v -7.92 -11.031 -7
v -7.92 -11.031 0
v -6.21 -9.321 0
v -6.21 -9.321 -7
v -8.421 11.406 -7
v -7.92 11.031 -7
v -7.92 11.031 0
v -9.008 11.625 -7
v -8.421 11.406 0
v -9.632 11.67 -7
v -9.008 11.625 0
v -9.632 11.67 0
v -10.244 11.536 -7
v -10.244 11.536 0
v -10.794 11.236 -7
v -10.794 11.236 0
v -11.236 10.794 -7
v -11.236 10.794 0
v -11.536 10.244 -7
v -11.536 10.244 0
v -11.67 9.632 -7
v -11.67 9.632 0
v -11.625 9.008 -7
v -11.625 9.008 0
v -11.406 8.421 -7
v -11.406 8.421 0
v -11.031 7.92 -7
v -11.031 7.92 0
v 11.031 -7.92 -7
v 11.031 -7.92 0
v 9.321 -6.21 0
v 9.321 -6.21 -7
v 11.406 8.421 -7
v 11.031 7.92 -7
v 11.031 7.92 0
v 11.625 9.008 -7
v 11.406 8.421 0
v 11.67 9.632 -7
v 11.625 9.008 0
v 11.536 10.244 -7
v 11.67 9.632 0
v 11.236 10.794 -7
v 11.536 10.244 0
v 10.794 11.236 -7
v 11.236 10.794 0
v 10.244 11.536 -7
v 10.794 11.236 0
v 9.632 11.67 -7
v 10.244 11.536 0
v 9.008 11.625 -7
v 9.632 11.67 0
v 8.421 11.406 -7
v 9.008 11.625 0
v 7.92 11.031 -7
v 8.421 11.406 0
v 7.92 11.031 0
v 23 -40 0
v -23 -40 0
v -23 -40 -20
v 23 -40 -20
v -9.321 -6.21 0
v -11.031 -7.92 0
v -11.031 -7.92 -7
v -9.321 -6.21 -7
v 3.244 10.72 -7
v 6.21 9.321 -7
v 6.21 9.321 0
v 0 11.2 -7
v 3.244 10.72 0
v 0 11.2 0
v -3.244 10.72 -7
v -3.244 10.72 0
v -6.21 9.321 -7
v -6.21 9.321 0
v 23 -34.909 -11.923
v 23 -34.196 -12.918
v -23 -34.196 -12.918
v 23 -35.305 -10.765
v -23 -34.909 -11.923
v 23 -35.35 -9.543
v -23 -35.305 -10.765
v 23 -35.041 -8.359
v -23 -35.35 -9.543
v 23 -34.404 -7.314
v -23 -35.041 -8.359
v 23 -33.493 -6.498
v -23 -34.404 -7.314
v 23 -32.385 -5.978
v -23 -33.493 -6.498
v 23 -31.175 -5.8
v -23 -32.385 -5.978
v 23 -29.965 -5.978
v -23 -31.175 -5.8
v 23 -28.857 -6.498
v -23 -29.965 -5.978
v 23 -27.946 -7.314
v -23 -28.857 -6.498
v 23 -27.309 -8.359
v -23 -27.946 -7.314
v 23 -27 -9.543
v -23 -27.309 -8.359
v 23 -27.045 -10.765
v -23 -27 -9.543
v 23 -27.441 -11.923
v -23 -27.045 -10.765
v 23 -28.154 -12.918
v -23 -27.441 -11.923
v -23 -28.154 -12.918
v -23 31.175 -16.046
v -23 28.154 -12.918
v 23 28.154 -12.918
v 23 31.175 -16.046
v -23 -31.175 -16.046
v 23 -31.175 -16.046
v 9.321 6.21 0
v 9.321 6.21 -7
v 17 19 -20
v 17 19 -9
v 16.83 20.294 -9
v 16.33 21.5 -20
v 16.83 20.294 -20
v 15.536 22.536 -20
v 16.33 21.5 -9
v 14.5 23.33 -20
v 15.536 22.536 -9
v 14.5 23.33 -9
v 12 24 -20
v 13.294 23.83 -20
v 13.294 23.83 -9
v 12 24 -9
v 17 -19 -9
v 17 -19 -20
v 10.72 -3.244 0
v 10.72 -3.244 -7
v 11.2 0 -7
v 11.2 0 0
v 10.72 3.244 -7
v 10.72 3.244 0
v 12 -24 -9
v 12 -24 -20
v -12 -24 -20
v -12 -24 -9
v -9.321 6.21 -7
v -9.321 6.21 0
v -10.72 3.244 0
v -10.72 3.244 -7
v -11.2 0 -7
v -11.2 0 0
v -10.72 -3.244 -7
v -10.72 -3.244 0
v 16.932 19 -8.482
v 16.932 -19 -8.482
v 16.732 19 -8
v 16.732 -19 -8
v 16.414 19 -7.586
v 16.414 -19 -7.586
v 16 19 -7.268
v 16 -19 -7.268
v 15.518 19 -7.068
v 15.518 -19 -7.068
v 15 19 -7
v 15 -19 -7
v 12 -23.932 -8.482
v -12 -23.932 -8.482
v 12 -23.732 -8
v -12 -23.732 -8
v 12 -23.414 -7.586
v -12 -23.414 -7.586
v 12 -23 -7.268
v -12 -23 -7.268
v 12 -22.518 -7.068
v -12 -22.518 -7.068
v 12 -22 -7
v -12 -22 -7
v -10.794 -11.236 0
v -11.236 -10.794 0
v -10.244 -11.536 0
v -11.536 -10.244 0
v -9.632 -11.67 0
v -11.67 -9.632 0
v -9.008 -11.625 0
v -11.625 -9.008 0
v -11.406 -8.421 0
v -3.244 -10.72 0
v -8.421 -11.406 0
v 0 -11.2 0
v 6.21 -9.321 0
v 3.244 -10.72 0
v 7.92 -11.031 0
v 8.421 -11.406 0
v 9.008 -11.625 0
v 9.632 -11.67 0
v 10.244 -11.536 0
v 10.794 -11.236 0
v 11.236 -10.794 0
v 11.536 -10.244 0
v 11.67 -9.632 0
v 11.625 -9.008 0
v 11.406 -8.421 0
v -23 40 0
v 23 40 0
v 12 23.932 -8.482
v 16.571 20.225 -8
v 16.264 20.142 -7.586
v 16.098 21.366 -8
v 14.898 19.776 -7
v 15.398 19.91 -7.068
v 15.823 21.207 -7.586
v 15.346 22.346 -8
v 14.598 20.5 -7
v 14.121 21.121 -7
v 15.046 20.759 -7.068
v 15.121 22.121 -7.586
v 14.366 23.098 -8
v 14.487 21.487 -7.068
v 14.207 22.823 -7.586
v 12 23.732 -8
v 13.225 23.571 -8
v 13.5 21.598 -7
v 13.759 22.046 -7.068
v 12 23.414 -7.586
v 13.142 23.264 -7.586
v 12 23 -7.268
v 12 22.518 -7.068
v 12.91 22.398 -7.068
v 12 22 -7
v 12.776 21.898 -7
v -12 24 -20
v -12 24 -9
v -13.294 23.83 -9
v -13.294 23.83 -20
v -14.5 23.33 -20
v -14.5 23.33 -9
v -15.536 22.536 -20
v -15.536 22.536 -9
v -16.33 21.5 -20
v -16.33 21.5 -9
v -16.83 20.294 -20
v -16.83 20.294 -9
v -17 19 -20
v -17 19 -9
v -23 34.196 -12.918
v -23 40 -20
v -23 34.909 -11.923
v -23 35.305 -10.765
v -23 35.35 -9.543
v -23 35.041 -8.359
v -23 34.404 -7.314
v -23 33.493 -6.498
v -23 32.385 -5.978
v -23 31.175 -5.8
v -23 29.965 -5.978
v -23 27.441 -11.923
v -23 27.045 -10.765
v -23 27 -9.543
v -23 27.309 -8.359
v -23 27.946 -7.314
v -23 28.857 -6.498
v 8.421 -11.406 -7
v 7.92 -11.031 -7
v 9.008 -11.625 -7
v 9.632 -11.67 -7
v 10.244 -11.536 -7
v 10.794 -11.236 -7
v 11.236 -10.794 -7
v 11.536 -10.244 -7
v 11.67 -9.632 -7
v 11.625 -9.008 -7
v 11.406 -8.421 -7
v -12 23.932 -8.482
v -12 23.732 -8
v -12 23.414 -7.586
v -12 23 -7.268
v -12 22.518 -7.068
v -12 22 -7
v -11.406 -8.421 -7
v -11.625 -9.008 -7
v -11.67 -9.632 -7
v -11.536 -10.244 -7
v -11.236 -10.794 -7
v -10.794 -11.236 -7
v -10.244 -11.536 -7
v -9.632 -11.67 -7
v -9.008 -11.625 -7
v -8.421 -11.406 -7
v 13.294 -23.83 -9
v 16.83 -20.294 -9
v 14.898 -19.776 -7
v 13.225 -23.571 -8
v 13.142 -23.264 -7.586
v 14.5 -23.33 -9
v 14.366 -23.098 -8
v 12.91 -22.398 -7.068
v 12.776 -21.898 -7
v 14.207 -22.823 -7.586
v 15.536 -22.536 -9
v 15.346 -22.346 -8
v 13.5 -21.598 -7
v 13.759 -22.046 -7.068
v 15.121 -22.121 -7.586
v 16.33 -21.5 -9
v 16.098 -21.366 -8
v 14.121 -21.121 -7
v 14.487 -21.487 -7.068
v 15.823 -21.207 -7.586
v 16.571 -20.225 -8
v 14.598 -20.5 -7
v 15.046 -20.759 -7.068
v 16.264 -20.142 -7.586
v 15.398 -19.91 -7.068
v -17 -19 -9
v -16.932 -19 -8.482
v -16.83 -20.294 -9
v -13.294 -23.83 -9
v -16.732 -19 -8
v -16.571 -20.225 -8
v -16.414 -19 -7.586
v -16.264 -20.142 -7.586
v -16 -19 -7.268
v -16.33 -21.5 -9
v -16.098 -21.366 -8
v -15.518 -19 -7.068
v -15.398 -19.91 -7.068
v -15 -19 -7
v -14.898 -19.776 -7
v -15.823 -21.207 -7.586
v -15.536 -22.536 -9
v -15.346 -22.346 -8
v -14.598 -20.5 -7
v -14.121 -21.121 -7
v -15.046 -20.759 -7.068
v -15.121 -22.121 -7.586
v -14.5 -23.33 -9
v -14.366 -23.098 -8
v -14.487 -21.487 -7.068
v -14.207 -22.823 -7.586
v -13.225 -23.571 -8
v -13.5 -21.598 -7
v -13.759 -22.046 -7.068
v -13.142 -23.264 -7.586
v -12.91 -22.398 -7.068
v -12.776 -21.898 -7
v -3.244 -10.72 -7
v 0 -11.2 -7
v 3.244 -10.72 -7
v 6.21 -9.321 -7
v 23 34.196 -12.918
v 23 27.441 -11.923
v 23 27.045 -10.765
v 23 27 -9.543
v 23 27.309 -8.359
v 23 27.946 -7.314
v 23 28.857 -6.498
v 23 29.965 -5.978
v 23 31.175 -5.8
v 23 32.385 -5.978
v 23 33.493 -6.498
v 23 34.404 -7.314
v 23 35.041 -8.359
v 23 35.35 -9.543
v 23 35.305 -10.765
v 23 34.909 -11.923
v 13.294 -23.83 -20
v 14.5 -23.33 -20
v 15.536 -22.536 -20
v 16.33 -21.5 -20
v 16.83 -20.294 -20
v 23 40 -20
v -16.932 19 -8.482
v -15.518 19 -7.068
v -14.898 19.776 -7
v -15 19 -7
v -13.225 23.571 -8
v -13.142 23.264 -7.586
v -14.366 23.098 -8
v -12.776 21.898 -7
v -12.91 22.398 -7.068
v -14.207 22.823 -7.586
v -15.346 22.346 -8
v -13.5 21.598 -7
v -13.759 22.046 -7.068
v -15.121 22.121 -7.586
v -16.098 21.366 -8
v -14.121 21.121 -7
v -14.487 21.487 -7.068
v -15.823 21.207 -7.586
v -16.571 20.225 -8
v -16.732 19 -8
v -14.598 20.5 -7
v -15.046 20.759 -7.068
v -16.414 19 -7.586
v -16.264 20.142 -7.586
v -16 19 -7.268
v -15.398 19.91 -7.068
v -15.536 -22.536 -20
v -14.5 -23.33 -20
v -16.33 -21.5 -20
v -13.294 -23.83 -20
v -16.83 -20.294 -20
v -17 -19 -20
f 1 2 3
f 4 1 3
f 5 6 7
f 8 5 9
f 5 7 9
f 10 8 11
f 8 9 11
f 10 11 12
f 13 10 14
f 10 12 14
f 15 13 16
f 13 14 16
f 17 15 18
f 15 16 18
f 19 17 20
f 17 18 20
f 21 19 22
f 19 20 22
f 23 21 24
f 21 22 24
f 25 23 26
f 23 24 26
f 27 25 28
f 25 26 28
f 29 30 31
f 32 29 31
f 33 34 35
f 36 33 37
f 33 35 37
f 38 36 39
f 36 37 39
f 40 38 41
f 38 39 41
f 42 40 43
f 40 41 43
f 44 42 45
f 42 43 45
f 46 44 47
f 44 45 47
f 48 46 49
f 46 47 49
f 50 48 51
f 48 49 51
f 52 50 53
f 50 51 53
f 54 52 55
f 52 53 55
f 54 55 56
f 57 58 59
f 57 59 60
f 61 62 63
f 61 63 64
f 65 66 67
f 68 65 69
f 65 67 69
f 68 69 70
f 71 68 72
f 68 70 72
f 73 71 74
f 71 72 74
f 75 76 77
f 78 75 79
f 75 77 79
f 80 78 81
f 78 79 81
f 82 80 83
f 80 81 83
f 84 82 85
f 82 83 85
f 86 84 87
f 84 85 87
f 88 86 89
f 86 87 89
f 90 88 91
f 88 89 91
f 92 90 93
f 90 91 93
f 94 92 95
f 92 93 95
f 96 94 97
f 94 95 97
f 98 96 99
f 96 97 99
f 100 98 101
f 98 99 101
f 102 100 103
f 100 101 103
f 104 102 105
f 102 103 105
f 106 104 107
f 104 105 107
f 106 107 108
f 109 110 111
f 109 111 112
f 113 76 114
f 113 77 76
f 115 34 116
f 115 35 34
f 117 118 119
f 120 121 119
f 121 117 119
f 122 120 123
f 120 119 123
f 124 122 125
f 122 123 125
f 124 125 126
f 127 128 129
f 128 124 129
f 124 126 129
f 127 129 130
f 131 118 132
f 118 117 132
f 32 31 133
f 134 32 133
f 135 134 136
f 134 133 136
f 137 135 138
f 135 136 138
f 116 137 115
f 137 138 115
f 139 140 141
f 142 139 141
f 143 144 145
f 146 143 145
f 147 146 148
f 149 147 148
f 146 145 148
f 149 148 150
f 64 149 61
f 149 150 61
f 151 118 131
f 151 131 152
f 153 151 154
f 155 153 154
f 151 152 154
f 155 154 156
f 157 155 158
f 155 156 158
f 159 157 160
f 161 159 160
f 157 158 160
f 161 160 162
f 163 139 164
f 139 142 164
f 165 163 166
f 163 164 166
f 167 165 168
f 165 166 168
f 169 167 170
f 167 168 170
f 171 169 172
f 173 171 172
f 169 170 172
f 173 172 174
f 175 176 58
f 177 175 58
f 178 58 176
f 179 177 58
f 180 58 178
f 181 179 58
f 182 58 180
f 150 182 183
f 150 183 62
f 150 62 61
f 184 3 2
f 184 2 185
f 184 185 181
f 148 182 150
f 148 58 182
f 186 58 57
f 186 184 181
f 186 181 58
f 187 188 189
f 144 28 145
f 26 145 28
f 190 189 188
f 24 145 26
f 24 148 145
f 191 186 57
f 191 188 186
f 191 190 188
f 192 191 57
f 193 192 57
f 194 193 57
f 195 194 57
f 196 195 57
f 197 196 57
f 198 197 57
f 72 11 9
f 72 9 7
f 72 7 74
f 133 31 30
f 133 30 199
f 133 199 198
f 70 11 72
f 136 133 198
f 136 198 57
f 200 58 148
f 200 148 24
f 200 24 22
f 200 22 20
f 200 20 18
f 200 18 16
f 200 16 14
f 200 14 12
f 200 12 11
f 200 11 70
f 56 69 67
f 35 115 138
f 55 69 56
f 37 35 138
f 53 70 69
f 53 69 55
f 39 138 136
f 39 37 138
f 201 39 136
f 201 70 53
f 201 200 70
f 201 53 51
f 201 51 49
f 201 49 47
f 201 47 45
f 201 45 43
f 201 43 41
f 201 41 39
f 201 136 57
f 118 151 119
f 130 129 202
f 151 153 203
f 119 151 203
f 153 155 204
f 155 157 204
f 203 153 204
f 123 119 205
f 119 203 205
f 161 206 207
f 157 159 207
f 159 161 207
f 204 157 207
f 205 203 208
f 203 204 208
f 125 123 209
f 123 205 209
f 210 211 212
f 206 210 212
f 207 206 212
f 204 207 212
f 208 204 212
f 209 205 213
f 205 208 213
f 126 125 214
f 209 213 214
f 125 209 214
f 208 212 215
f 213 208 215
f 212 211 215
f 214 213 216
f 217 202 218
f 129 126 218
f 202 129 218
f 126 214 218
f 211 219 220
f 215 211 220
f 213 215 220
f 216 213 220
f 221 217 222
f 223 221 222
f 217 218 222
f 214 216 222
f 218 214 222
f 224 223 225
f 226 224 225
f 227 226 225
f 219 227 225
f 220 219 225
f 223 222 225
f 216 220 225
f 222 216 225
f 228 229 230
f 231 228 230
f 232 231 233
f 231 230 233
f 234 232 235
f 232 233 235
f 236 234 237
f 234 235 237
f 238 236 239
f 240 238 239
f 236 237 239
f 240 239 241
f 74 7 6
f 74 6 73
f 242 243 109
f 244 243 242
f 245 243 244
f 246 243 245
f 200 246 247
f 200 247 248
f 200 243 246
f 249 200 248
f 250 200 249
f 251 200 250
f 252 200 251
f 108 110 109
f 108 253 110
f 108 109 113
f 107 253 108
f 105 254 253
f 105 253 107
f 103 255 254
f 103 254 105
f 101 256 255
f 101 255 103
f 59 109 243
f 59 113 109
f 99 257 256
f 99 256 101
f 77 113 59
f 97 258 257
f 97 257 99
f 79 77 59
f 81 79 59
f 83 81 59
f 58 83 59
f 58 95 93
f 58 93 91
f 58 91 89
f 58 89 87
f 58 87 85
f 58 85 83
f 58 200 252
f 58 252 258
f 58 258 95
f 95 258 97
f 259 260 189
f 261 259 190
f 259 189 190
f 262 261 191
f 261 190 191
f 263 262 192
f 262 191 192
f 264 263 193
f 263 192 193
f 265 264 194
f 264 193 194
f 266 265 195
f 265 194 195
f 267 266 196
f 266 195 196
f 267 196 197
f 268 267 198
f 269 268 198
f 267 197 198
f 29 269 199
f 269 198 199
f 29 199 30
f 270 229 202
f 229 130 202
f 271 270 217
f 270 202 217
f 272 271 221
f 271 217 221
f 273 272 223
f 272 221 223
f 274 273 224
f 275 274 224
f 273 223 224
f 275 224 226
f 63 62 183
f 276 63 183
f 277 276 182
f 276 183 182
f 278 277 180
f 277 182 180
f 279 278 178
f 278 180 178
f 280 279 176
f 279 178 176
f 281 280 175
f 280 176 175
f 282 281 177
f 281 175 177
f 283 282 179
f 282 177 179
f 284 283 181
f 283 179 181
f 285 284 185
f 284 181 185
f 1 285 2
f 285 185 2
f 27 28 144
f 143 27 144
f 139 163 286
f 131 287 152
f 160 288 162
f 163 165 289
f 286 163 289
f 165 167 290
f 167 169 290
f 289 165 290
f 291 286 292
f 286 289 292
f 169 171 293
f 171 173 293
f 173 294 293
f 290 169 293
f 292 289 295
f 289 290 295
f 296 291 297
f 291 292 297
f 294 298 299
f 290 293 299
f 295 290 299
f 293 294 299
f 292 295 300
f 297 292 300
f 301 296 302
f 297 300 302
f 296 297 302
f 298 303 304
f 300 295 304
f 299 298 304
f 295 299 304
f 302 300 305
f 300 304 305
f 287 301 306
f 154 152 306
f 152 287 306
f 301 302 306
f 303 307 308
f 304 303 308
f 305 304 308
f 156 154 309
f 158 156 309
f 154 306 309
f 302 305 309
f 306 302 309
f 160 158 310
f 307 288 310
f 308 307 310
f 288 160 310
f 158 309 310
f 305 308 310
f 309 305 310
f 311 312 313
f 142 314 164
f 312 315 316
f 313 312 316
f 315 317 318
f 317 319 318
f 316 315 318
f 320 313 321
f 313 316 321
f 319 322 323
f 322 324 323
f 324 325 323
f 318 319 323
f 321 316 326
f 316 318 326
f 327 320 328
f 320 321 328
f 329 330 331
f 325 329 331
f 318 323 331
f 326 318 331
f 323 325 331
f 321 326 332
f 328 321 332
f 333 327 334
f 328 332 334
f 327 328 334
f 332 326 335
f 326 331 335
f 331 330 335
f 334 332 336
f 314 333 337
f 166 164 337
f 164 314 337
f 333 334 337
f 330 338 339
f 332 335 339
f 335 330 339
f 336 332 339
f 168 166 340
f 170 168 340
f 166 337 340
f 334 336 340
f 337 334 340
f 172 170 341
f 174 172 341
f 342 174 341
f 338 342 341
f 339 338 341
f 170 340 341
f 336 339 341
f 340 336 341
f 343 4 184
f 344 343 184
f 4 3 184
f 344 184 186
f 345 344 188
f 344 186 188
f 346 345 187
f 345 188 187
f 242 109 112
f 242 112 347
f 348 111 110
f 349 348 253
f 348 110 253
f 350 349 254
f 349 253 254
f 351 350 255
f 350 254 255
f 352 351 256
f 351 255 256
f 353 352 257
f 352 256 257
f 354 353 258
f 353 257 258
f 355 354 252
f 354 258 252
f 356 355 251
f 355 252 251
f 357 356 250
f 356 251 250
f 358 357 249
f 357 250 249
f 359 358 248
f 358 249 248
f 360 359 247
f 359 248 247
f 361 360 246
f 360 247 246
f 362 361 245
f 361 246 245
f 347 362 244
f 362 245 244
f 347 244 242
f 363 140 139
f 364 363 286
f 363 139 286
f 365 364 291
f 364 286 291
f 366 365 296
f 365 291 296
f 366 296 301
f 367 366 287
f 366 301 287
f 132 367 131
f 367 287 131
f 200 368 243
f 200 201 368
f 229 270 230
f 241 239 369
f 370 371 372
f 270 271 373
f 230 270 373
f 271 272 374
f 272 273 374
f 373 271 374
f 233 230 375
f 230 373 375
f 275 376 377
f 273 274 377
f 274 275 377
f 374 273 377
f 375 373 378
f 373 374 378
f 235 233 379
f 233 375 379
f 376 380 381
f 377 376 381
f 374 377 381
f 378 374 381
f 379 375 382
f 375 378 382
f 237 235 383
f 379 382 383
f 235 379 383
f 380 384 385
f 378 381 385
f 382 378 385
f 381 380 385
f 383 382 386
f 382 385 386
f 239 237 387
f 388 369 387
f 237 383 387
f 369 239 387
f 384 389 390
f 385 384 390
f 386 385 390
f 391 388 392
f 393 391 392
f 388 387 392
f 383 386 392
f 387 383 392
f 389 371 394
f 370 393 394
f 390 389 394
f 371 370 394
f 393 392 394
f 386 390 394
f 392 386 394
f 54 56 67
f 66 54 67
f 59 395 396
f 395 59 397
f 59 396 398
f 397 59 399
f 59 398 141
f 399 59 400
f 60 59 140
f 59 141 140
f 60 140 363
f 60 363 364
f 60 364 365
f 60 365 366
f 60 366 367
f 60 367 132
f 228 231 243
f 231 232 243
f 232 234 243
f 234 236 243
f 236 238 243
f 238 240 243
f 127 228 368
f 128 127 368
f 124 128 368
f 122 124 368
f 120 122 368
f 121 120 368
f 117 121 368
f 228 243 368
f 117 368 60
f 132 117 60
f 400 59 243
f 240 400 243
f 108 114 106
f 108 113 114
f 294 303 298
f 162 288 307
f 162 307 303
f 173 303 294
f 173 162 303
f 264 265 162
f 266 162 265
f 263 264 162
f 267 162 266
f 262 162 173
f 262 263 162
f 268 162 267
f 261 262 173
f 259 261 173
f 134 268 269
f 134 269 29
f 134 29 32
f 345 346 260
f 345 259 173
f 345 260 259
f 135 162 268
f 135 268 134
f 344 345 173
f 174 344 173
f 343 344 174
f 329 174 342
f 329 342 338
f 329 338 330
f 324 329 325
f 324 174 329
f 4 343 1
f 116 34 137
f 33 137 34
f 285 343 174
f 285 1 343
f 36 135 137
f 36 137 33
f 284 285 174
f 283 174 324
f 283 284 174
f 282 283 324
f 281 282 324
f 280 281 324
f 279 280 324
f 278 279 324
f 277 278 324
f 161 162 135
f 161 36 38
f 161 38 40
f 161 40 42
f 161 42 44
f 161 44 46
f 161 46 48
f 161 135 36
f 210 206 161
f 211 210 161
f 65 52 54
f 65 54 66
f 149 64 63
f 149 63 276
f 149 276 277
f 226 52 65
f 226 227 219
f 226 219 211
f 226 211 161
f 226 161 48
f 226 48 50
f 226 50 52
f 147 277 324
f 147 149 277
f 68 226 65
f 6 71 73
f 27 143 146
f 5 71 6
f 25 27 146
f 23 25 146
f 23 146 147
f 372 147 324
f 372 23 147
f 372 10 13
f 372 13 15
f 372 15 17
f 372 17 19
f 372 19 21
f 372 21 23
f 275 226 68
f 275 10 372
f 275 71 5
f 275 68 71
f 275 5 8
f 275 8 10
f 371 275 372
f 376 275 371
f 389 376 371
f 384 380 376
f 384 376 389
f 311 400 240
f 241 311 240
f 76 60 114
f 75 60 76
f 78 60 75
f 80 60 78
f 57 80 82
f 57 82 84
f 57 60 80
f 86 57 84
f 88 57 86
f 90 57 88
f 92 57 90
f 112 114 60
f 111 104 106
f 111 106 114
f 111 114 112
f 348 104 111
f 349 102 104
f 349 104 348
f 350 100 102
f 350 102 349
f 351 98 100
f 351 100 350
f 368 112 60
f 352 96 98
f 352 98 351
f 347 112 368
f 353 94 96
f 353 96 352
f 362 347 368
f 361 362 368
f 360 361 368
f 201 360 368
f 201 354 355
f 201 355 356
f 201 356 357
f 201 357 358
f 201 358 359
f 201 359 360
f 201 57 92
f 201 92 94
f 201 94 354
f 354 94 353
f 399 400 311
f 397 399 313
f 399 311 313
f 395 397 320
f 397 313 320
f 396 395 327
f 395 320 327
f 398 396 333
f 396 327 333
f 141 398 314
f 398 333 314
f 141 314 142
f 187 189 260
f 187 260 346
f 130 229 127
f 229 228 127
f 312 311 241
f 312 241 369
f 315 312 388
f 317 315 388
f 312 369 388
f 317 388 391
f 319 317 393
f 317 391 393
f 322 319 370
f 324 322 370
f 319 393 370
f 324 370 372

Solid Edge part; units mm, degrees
sketch "Sketch1" plane through (0, 0, 0) normal (0, 0, 1) x (1, 0, 0)
  line L0 (-23, -40) -> (23, -40)
  line L1 (23, -40) -> (23, 40)
  line L2 (23, 40) -> (-23, 40)
  line L3 (-23, 40) -> (-23, -40)
extrude "Protrusion1" add sketch "Sketch1" against normal blind 20
sketch "Sketch2" plane through (-23, 0, -10) normal (-1, 0, 0) x (0, -1, 0)
  circle A0 centre (31.175, 0) radius 4.2
  circle A1 centre (-31.175, 0) radius 4.2
  dimension "D1" = 10
  dimension "D2" = 8.825
  dimension "D3" = 62.35
extrude "Cutout1" cut sketch "Sketch2" against normal through all
sketch "Sketch3" plane through (-23, 0, -10) normal (-1, 0, 0) x (0, -1, 0)
  line L0 (31.175, 0) -> (34.1962, -2.9176)
  line L1 (34.1962, -2.9176) -> (31.175, -6.0461)
  line L2 (31.175, -6.0461) -> (28.1538, -2.9176)
  line L3 (28.1538, -2.9176) -> (31.175, 0)
  line L4 (-31.175, 0) -> (-28.1538, -2.9176)
  line L5 (-28.1538, -2.9176) -> (-31.175, -6.0461)
  line L6 (-31.175, -6.0461) -> (-34.1962, -2.9176)
  line L7 (-34.1962, -2.9176) -> (-31.175, 0)
extrude "Cutout2" cut sketch "Sketch3" against normal through all
sketch "Sketch4" plane through (0, 0, -20) normal (0, 0, -1) x (0, -1, 0)
  line L0 (-24, -17) -> (24, -17)
  line L1 (24, -17) -> (24, 17)
  line L2 (24, 17) -> (-24, 17)
  line L3 (-24, 17) -> (-24, -17)
  dimension "D1" = 48
  dimension "D2" = 34
  dimension "D3" = 6
extrude "Cutout3" cut sketch "Sketch4" against normal up to vertex (13 mm away)
sketch "Sketch5" plane through (0, 0, 0) normal (0, 0, 1) x (1, 0, 0)
  arc A0 (-9.3209, -6.2097) -> (-9.3209, 6.2097) centre (0, 0) cw
  line L0 (-11.0309, 7.9196) -> (-9.3209, 6.2097)
  arc A1 (-11.0309, 7.9196) -> (-7.9196, 11.0309) centre (-9.4752, 9.4752) cw
  line L1 (-7.9196, 11.0309) -> (-6.2097, 9.3209)
  arc A2 (-6.2097, 9.3209) -> (6.2097, 9.3209) centre (0, 0) cw
  line L2 (7.9196, 11.0309) -> (6.2097, 9.3209)
  line L3 (11.0309, 7.9196) -> (9.3209, 6.2097)
  line L4 (11.0309, -7.9196) -> (9.3209, -6.2097)
  arc A3 (11.0309, -7.9196) -> (7.9196, -11.0309) centre (9.4752, -9.4752) cw
  line L5 (7.9196, -11.0309) -> (6.2097, -9.3209)
  arc A4 (6.2097, -9.3209) -> (-6.2097, -9.3209) centre (0, 0) cw
  line L6 (-7.9196, -11.0309) -> (-6.2097, -9.3209)
  arc A5 (-7.9196, -11.0309) -> (-11.0309, -7.9196) centre (-9.4752, -9.4752) cw
  line L7 (-11.0309, -7.9196) -> (-9.3209, -6.2097)
  arc A6 (7.9196, 11.0309) -> (11.0309, 7.9196) centre (9.4752, 9.4752) cw
  arc A7 (9.3209, 6.2097) -> (9.3209, -6.2097) centre (0, 0) cw
extrude "Cutout4" cut sketch "Sketch5" against normal through all
fillet "Round_1" radius 5 4 edges at (-17, 24, -13.5) (-17, -24, -13.5) (17, -24, -13.5) (17, 24, -13.5)
fillet "Round_2" radius 2 8 edges at (0, -24, -7) (-15.5355, -22.5355, -7) (-17, 0, -7) (-15.5355, 22.5355, -7) (0, 24, -7) (15.5355, 22.5355, -7) (17, 0, -7) (15.5355, -22.5355, -7)
